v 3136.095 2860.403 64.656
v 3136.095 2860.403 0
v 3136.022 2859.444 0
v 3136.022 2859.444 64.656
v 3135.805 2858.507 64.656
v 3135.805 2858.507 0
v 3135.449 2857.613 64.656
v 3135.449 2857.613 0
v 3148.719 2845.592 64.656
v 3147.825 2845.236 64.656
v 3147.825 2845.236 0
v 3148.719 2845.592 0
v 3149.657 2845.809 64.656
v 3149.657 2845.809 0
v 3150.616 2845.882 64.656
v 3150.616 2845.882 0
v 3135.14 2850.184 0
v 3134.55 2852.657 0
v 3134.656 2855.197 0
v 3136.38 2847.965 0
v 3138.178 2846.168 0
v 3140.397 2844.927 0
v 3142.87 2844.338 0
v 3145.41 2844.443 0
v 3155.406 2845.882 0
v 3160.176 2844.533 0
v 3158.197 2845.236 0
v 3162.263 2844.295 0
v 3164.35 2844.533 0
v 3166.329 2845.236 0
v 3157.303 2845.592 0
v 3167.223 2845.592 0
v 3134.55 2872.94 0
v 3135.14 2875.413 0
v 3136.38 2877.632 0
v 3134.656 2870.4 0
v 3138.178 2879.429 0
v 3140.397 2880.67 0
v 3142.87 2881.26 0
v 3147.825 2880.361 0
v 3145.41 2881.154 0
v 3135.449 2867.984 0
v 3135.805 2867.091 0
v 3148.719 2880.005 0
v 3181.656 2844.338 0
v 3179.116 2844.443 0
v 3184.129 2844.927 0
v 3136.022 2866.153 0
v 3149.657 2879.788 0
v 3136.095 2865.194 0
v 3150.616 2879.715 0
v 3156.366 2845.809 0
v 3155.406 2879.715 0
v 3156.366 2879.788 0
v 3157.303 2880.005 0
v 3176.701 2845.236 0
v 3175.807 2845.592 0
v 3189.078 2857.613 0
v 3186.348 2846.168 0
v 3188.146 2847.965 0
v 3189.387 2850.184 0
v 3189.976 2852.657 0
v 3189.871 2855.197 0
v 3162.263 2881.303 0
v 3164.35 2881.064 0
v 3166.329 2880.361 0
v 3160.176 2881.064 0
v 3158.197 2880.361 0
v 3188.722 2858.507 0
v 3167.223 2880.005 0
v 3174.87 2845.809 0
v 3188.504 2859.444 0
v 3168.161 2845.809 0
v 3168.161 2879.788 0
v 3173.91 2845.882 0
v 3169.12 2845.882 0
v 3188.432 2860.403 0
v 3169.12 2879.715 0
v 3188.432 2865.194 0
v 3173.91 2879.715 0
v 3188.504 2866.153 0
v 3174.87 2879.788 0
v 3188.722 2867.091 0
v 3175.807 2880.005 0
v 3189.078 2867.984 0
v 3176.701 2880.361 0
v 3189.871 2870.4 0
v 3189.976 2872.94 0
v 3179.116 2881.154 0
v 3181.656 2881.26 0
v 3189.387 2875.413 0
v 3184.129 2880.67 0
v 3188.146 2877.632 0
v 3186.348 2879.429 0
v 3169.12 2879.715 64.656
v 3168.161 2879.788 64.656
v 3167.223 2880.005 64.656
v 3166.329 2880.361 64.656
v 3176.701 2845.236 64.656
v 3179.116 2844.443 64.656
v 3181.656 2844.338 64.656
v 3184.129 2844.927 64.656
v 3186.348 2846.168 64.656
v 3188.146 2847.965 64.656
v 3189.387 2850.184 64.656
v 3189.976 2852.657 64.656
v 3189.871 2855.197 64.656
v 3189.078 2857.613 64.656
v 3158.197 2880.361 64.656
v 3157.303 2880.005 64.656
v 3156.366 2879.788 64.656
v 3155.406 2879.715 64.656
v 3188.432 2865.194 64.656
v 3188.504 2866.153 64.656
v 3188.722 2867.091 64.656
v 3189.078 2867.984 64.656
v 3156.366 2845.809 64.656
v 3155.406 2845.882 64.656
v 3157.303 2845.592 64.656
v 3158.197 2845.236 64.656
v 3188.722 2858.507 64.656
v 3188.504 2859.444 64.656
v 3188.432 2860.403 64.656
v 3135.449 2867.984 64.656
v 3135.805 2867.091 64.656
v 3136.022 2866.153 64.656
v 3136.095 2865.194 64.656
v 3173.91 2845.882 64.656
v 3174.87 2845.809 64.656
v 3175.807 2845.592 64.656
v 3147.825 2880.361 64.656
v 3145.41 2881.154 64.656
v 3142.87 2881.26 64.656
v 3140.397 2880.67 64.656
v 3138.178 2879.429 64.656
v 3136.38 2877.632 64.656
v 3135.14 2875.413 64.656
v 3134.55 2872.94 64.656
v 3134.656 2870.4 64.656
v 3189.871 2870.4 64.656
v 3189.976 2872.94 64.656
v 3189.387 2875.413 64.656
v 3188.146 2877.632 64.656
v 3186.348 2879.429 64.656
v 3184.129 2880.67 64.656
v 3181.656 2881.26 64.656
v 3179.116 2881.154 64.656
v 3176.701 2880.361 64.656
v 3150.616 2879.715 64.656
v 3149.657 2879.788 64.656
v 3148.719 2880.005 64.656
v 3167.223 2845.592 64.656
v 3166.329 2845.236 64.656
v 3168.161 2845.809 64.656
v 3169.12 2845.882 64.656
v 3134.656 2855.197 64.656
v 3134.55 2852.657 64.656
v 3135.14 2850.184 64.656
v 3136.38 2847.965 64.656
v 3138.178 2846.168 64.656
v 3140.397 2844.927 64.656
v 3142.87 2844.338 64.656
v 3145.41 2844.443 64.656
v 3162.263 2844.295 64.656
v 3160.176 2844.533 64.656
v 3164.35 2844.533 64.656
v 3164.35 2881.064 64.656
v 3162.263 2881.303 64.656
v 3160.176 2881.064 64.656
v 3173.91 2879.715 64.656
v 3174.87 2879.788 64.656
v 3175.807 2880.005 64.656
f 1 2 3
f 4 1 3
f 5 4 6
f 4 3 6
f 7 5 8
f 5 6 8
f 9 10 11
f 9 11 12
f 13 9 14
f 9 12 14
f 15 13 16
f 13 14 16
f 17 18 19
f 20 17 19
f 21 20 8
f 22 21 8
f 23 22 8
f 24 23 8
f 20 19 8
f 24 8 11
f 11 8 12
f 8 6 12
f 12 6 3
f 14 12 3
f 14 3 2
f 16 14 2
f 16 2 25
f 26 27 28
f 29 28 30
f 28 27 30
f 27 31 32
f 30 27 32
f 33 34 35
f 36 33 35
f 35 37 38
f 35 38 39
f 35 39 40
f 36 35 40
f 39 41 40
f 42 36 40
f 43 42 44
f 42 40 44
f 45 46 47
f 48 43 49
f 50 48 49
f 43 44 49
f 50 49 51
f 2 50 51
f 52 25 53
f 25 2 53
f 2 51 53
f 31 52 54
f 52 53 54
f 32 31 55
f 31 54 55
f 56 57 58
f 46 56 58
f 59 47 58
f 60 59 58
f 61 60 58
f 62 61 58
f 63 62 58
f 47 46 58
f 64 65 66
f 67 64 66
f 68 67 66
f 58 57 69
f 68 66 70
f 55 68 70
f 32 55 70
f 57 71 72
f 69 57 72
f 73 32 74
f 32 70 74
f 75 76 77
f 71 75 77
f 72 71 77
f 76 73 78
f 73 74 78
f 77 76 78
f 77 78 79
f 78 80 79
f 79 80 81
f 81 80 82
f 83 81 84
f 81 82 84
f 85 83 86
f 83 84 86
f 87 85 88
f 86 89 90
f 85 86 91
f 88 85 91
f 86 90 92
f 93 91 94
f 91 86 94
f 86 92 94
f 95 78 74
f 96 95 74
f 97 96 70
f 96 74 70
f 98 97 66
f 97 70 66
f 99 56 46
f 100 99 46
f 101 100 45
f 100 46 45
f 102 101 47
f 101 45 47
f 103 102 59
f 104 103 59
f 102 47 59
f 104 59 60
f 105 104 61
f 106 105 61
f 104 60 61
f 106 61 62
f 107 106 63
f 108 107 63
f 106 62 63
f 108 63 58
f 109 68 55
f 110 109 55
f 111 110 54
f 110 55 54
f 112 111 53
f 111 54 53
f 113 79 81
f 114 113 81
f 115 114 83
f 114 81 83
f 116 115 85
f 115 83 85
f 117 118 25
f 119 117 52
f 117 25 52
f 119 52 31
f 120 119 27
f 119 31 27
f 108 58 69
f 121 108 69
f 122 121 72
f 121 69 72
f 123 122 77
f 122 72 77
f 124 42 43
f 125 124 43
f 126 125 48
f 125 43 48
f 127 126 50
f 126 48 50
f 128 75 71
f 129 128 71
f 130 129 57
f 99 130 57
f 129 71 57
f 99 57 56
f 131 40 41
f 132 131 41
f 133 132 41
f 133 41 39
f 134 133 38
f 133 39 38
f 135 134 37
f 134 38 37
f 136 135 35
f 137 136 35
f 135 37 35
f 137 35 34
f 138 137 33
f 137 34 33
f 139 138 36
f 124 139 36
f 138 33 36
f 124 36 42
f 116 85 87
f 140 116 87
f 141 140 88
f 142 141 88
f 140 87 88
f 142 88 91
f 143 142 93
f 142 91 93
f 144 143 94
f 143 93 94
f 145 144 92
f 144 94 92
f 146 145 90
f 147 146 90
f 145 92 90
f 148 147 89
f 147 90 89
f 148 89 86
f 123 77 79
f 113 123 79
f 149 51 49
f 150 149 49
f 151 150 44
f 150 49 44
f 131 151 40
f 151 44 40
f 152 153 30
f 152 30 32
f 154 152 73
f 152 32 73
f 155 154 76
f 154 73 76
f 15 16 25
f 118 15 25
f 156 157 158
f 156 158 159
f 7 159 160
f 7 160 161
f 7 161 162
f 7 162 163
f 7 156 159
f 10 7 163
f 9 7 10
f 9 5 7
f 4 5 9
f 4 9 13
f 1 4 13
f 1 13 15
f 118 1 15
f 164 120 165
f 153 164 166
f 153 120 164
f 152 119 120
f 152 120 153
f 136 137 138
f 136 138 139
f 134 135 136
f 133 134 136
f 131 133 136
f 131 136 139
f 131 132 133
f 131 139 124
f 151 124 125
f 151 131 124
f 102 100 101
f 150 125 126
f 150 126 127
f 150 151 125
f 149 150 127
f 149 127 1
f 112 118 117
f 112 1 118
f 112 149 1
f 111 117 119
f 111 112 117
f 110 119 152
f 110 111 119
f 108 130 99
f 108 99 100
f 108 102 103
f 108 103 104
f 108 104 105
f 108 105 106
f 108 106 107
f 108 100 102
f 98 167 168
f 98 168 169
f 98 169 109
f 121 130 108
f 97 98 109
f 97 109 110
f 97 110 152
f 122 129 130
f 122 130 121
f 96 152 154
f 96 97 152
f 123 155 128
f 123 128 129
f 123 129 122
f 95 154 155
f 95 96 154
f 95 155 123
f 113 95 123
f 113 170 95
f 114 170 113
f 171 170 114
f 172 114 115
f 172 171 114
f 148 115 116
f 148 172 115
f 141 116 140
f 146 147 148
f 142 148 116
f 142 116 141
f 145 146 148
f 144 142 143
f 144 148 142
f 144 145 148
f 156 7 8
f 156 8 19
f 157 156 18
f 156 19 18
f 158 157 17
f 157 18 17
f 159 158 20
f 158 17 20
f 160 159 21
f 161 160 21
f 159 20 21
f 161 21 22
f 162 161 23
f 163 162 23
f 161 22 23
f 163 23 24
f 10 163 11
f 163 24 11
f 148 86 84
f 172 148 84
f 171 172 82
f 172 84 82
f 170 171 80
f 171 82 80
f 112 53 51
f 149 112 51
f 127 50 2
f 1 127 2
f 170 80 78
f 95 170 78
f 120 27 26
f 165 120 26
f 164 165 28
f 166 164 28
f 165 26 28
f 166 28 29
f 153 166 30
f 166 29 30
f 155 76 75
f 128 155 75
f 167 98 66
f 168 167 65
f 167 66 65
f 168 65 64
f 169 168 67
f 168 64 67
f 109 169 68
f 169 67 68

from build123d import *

# Parameters (mm, degrees)
BOSS_EXTRUDE1_DEPTH = 64.6557


with BuildPart() as part:
    # Sketch1 → Boss-Extrude1 (new body)
    with BuildSketch(Plane.XY):
        with BuildLine():
            Line((3150.616152352, 2845.882200994), (3155.406404405, 2845.882200994))
            ThreePointArc((3155.406404405, 2845.882200994), (3156.838678555, 2845.718564285), (3158.197134553, 2845.236087848))
            ThreePointArc((3158.197134553, 2845.236087848), (3162.263228379, 2844.294700994), (3166.329322204, 2845.236087848))
            ThreePointArc((3166.329322204, 2845.236087848), (3167.687778202, 2845.718564285), (3169.120052352, 2845.882200994))
            Line((3169.120052352, 2845.882200994), (3173.910304405, 2845.882200994))
            ThreePointArc((3173.910304405, 2845.882200994), (3175.342578555, 2845.718564285), (3176.701034553, 2845.236087848))
            ThreePointArc((3176.701034553, 2845.236087848), (3187.309244963, 2847.00453441), (3189.077691525, 2857.61274482))
            ThreePointArc((3189.077691525, 2857.61274482), (3188.595215088, 2858.971200818), (3188.431578378, 2860.403474968))
            Line((3188.431578378, 2860.403474968), (3188.431578378, 2865.193727021))
            ThreePointArc((3188.431578378, 2865.193727021), (3188.595215088, 2866.626001171), (3189.077691525, 2867.984457169))
            ThreePointArc((3189.077691525, 2867.984457169), (3187.309244963, 2878.592667579), (3176.701034553, 2880.361114141))
            ThreePointArc((3176.701034553, 2880.361114141), (3175.342578555, 2879.878637704), (3173.910304405, 2879.715000994))
            Line((3173.910304405, 2879.715000994), (3169.120052352, 2879.715000994))
            ThreePointArc((3169.120052352, 2879.715000994), (3167.687778202, 2879.878637704), (3166.329322204, 2880.361114141))
            ThreePointArc((3166.329322204, 2880.361114141), (3162.263228379, 2881.302500994), (3158.197134553, 2880.361114141))
            ThreePointArc((3158.197134553, 2880.361114141), (3156.838678555, 2879.878637704), (3155.406404405, 2879.715000994))
            Line((3155.406404405, 2879.715000994), (3150.616152352, 2879.715000994))
            ThreePointArc((3150.616152352, 2879.715000994), (3149.183878202, 2879.878637704), (3147.825422204, 2880.361114141))
            ThreePointArc((3147.825422204, 2880.361114141), (3137.217211794, 2878.592667579), (3135.448765232, 2867.984457169))
            ThreePointArc((3135.448765232, 2867.984457169), (3135.931241669, 2866.626001171), (3136.094878379, 2865.193727021))
            Line((3136.094878379, 2865.193727021), (3136.094878379, 2860.403474968))
            ThreePointArc((3136.094878379, 2860.403474968), (3135.931241669, 2858.971200818), (3135.448765232, 2857.61274482))
            ThreePointArc((3135.448765232, 2857.61274482), (3137.217211794, 2847.00453441), (3147.825422204, 2845.236087848))
            ThreePointArc((3147.825422204, 2845.236087848), (3149.183878202, 2845.718564285), (3150.616152352, 2845.882200994))
        make_face()
    extrude(amount=BOSS_EXTRUDE1_DEPTH)


solid = part.part
